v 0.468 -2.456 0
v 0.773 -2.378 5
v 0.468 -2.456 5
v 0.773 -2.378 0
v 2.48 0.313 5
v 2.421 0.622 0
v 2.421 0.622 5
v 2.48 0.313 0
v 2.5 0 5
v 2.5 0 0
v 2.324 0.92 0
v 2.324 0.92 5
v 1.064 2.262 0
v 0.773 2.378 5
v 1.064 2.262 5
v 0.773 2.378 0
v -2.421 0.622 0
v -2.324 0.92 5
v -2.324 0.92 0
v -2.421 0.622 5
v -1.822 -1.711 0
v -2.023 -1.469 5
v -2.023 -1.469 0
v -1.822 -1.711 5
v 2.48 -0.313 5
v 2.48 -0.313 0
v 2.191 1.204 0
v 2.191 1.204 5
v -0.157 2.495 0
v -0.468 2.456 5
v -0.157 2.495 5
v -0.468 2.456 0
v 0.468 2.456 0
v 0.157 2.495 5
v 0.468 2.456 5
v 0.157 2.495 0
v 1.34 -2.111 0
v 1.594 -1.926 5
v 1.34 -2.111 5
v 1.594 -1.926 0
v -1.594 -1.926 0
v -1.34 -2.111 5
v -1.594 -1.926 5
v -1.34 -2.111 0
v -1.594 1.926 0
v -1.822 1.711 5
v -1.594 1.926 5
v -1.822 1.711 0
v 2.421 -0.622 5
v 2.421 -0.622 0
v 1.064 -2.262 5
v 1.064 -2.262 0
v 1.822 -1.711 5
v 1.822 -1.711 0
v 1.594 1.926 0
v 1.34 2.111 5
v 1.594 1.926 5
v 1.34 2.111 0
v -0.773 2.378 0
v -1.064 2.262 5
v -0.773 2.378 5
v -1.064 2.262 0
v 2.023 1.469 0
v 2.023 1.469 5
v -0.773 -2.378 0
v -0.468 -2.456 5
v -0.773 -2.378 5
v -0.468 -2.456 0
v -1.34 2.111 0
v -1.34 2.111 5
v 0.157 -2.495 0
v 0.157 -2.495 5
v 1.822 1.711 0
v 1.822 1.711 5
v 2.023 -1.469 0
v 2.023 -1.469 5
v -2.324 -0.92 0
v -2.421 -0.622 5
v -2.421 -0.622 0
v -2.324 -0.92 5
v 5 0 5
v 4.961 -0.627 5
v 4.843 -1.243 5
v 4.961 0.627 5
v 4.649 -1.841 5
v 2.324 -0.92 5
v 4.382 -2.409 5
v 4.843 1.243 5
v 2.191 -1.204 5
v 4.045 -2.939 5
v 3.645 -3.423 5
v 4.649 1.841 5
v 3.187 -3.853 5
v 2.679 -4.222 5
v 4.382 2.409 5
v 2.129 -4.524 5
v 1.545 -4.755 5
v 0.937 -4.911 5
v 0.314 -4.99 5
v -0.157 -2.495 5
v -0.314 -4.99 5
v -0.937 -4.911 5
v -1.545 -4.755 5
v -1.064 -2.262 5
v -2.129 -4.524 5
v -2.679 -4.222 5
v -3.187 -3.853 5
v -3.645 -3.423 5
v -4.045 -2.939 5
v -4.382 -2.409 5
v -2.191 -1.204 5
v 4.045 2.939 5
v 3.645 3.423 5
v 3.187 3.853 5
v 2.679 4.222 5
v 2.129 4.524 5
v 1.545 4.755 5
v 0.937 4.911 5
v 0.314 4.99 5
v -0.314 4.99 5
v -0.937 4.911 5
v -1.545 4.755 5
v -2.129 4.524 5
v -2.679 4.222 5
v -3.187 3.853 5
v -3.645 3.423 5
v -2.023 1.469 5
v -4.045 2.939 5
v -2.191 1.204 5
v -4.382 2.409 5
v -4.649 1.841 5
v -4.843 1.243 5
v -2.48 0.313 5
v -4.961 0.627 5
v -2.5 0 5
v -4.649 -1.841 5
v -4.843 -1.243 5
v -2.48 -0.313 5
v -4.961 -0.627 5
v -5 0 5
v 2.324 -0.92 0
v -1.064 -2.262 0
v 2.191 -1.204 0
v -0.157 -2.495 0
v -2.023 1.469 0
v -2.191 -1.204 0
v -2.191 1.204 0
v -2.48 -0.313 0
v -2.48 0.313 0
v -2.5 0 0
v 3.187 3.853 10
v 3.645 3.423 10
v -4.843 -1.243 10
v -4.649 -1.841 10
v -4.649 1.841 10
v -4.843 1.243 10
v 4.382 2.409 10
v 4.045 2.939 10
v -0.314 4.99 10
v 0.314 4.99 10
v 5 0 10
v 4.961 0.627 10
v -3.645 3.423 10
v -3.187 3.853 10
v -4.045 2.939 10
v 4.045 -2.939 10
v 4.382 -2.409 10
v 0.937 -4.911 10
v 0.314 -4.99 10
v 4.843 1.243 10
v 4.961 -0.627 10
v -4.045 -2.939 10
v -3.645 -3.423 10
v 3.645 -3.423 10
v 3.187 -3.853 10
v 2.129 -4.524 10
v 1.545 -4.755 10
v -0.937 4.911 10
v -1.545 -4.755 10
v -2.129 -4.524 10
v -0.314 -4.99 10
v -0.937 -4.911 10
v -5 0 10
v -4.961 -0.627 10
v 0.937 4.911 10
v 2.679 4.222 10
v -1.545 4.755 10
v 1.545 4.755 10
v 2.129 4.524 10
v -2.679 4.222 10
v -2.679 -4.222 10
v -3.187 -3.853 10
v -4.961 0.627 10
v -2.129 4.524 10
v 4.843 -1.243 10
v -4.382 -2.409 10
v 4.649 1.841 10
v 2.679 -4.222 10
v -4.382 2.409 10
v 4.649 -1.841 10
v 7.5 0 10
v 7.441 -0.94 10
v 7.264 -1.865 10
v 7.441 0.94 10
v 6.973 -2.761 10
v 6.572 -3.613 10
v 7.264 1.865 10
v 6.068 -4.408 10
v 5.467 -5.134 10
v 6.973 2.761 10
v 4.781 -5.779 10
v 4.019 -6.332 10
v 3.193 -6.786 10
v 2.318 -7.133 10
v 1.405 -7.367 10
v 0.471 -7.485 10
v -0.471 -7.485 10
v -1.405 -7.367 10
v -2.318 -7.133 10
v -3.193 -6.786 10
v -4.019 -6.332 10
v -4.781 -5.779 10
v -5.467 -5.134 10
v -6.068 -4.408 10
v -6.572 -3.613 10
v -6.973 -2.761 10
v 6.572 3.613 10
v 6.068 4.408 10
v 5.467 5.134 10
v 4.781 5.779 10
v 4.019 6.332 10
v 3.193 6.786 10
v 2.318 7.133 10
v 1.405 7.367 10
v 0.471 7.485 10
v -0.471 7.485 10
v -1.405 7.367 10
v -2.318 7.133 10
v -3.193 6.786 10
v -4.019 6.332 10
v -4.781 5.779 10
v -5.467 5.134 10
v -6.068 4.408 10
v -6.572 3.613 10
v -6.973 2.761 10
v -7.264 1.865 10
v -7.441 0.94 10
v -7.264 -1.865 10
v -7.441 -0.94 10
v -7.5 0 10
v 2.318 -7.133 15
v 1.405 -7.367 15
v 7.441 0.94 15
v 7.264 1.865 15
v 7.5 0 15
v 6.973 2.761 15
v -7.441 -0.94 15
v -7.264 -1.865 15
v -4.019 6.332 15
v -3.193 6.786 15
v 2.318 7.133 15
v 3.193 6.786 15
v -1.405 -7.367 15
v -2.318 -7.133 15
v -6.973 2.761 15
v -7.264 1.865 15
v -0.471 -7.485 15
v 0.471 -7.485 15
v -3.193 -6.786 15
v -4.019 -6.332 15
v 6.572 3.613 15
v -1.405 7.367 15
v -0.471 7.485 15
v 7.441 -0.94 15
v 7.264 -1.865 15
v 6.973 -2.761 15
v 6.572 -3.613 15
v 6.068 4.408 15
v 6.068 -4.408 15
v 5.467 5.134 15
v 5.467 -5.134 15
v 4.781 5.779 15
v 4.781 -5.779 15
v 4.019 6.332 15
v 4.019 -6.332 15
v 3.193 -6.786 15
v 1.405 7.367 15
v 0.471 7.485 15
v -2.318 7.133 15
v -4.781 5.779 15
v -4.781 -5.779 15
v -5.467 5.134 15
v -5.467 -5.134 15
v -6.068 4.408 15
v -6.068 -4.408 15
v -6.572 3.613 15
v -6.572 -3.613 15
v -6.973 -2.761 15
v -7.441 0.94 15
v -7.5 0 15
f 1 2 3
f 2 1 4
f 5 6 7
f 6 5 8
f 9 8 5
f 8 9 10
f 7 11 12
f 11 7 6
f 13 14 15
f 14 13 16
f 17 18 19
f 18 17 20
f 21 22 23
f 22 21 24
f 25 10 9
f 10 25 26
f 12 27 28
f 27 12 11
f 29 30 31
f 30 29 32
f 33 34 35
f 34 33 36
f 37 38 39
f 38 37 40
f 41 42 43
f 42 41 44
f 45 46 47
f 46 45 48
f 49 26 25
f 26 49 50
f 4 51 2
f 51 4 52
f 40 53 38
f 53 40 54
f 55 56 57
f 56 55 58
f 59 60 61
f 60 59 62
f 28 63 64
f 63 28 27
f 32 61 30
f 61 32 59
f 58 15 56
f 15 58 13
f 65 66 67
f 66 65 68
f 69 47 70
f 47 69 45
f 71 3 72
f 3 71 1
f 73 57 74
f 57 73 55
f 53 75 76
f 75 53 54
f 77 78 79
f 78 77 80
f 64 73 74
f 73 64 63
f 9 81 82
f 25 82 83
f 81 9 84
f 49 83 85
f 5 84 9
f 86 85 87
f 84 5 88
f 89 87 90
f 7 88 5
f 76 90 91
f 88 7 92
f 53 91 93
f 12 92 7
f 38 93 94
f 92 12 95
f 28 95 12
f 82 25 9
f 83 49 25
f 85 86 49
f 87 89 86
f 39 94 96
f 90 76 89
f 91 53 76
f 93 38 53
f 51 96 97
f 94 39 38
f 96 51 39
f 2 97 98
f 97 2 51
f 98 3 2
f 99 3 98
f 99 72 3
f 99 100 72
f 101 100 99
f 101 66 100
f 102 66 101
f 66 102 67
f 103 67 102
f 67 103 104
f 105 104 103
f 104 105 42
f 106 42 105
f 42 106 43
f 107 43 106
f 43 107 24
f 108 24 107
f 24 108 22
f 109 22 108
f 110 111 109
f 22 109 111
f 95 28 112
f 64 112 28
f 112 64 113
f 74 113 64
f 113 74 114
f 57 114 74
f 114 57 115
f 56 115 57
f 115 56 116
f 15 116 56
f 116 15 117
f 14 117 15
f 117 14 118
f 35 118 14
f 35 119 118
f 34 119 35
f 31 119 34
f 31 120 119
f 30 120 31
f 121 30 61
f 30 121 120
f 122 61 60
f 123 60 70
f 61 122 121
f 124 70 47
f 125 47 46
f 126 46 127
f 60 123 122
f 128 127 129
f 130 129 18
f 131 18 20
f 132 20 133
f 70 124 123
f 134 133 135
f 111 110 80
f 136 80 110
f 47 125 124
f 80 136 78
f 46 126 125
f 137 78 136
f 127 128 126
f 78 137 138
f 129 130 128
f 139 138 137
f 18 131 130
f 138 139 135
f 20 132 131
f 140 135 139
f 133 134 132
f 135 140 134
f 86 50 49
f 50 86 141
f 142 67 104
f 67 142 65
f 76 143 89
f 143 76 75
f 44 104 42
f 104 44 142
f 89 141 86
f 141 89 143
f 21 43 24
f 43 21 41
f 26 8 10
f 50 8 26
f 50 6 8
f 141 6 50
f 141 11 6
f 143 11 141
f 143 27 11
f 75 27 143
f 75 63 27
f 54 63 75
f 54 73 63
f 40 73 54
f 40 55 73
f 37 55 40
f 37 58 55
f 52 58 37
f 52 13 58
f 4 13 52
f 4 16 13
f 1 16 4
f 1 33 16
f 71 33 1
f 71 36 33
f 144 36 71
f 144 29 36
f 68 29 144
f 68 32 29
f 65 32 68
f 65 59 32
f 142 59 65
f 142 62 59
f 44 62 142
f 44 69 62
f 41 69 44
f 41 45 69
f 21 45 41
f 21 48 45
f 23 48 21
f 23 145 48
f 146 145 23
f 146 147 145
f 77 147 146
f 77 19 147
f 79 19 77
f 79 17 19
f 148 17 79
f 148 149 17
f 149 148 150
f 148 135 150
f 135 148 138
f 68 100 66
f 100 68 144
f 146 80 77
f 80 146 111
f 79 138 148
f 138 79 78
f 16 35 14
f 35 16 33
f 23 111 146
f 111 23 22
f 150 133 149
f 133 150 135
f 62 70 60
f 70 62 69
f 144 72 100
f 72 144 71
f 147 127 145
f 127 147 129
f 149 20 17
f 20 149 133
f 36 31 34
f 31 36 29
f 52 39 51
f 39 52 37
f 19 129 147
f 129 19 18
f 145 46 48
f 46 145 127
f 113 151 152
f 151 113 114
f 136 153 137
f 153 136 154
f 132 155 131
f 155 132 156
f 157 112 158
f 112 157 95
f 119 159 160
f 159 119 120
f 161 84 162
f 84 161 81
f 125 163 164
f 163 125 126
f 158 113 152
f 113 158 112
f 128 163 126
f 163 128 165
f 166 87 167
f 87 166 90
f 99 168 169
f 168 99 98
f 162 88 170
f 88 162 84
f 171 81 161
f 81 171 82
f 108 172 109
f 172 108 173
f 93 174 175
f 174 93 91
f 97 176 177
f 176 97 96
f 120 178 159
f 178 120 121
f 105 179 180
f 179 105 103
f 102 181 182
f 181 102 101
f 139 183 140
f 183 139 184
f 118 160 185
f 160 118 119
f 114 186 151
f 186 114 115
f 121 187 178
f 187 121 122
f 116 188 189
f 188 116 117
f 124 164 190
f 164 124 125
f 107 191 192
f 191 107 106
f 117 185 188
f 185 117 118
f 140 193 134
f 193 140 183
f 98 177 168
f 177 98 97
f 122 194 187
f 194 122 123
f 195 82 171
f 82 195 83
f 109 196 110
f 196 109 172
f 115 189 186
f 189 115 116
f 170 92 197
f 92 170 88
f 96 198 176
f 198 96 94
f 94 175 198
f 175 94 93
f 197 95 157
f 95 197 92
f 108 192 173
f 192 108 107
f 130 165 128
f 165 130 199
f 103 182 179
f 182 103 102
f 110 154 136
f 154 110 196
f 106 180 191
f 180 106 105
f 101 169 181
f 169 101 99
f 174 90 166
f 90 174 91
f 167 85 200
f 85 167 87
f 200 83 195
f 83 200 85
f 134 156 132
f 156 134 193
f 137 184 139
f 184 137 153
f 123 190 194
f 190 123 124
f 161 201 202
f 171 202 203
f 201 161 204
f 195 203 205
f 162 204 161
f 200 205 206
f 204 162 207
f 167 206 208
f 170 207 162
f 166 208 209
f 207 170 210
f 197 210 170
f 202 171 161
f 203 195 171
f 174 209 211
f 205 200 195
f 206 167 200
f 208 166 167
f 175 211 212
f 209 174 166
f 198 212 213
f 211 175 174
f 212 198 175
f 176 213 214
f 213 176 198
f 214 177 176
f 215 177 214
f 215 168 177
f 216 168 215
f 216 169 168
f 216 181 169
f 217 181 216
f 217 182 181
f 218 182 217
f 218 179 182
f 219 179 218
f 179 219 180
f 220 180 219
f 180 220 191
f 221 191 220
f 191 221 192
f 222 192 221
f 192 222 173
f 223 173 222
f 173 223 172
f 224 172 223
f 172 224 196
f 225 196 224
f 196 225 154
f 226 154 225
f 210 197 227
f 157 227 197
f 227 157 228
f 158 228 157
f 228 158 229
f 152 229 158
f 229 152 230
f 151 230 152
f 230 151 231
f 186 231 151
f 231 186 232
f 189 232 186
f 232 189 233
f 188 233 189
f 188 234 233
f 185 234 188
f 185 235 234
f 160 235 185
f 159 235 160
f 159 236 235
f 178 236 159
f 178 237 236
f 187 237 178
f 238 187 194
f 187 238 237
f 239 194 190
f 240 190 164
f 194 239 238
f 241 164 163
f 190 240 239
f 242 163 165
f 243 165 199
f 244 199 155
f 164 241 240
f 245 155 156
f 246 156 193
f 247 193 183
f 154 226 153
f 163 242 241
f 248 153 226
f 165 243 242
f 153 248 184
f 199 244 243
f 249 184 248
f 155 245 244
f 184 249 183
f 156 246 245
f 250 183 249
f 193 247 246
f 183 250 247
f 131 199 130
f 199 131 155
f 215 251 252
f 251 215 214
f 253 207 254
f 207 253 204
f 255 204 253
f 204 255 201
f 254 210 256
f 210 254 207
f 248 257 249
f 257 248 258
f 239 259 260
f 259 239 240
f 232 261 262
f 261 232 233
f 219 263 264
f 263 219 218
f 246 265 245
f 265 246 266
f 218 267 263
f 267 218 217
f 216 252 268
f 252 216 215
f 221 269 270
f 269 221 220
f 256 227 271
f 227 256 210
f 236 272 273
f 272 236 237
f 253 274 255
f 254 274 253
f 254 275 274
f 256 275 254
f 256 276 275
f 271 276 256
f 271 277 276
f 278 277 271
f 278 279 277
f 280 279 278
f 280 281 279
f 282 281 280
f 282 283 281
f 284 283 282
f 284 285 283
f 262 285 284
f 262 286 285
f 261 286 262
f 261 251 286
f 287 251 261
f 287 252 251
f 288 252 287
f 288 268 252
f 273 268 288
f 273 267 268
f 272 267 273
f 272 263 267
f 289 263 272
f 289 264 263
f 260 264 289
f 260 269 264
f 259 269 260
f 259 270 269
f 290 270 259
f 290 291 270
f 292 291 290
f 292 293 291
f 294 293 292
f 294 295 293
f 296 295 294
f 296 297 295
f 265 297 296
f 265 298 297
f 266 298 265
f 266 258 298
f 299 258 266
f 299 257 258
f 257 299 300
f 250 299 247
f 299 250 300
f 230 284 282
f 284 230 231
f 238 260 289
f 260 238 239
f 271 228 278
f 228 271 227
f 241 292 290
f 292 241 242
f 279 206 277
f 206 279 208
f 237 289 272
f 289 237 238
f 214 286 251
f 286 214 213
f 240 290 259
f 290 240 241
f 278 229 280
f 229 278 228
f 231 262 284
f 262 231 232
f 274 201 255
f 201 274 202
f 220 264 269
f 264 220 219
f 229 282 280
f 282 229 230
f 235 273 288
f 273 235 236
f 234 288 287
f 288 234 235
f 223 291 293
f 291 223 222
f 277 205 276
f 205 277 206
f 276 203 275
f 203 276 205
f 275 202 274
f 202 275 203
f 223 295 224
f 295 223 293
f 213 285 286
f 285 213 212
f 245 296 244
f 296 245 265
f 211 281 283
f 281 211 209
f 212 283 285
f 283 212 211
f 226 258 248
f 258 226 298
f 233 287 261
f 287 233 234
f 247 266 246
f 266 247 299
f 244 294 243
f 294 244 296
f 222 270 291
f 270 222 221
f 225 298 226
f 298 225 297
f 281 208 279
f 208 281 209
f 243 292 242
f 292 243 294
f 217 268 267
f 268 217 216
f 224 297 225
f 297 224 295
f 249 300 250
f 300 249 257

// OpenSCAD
$fn=50;

wall=2;
rad=5.2;
dikte=1;
lengte=25;
breedte=10;

module outline_ext(w=1) {
  difference() {
    offset(w) children();
    offset(0) children();
  }
}

module outline(w=1) {
    offset(w/ 2) children();
}

*color("blue") linear_extrude(height=5+dikte){
  outline_ext(w=wall) circle(rad);
  translate([-rad,-rad/2-1,0]) square([2,rad+2]);
}

//bodem schroefgat
*linear_extrude(dikte) outline_ext(w=rad) circle(2);


// onderplaat
*translate([breedte/2,0,0]) square([lengte,breedte], center=true);

 *for (a=[0:5]) 
  translate([breedte/2,a*20,0]) linear_extrude(dikte) square([lengte,breedte], center=true);

* for (i=[0:15:360])
  rotate([i,90,0])
    translate([0,10,0])
     outline(w=1)  square(10);

for (i=[0:5:15])
  translate([0,0,i-5])
    cylinder(d=i,h=5);
